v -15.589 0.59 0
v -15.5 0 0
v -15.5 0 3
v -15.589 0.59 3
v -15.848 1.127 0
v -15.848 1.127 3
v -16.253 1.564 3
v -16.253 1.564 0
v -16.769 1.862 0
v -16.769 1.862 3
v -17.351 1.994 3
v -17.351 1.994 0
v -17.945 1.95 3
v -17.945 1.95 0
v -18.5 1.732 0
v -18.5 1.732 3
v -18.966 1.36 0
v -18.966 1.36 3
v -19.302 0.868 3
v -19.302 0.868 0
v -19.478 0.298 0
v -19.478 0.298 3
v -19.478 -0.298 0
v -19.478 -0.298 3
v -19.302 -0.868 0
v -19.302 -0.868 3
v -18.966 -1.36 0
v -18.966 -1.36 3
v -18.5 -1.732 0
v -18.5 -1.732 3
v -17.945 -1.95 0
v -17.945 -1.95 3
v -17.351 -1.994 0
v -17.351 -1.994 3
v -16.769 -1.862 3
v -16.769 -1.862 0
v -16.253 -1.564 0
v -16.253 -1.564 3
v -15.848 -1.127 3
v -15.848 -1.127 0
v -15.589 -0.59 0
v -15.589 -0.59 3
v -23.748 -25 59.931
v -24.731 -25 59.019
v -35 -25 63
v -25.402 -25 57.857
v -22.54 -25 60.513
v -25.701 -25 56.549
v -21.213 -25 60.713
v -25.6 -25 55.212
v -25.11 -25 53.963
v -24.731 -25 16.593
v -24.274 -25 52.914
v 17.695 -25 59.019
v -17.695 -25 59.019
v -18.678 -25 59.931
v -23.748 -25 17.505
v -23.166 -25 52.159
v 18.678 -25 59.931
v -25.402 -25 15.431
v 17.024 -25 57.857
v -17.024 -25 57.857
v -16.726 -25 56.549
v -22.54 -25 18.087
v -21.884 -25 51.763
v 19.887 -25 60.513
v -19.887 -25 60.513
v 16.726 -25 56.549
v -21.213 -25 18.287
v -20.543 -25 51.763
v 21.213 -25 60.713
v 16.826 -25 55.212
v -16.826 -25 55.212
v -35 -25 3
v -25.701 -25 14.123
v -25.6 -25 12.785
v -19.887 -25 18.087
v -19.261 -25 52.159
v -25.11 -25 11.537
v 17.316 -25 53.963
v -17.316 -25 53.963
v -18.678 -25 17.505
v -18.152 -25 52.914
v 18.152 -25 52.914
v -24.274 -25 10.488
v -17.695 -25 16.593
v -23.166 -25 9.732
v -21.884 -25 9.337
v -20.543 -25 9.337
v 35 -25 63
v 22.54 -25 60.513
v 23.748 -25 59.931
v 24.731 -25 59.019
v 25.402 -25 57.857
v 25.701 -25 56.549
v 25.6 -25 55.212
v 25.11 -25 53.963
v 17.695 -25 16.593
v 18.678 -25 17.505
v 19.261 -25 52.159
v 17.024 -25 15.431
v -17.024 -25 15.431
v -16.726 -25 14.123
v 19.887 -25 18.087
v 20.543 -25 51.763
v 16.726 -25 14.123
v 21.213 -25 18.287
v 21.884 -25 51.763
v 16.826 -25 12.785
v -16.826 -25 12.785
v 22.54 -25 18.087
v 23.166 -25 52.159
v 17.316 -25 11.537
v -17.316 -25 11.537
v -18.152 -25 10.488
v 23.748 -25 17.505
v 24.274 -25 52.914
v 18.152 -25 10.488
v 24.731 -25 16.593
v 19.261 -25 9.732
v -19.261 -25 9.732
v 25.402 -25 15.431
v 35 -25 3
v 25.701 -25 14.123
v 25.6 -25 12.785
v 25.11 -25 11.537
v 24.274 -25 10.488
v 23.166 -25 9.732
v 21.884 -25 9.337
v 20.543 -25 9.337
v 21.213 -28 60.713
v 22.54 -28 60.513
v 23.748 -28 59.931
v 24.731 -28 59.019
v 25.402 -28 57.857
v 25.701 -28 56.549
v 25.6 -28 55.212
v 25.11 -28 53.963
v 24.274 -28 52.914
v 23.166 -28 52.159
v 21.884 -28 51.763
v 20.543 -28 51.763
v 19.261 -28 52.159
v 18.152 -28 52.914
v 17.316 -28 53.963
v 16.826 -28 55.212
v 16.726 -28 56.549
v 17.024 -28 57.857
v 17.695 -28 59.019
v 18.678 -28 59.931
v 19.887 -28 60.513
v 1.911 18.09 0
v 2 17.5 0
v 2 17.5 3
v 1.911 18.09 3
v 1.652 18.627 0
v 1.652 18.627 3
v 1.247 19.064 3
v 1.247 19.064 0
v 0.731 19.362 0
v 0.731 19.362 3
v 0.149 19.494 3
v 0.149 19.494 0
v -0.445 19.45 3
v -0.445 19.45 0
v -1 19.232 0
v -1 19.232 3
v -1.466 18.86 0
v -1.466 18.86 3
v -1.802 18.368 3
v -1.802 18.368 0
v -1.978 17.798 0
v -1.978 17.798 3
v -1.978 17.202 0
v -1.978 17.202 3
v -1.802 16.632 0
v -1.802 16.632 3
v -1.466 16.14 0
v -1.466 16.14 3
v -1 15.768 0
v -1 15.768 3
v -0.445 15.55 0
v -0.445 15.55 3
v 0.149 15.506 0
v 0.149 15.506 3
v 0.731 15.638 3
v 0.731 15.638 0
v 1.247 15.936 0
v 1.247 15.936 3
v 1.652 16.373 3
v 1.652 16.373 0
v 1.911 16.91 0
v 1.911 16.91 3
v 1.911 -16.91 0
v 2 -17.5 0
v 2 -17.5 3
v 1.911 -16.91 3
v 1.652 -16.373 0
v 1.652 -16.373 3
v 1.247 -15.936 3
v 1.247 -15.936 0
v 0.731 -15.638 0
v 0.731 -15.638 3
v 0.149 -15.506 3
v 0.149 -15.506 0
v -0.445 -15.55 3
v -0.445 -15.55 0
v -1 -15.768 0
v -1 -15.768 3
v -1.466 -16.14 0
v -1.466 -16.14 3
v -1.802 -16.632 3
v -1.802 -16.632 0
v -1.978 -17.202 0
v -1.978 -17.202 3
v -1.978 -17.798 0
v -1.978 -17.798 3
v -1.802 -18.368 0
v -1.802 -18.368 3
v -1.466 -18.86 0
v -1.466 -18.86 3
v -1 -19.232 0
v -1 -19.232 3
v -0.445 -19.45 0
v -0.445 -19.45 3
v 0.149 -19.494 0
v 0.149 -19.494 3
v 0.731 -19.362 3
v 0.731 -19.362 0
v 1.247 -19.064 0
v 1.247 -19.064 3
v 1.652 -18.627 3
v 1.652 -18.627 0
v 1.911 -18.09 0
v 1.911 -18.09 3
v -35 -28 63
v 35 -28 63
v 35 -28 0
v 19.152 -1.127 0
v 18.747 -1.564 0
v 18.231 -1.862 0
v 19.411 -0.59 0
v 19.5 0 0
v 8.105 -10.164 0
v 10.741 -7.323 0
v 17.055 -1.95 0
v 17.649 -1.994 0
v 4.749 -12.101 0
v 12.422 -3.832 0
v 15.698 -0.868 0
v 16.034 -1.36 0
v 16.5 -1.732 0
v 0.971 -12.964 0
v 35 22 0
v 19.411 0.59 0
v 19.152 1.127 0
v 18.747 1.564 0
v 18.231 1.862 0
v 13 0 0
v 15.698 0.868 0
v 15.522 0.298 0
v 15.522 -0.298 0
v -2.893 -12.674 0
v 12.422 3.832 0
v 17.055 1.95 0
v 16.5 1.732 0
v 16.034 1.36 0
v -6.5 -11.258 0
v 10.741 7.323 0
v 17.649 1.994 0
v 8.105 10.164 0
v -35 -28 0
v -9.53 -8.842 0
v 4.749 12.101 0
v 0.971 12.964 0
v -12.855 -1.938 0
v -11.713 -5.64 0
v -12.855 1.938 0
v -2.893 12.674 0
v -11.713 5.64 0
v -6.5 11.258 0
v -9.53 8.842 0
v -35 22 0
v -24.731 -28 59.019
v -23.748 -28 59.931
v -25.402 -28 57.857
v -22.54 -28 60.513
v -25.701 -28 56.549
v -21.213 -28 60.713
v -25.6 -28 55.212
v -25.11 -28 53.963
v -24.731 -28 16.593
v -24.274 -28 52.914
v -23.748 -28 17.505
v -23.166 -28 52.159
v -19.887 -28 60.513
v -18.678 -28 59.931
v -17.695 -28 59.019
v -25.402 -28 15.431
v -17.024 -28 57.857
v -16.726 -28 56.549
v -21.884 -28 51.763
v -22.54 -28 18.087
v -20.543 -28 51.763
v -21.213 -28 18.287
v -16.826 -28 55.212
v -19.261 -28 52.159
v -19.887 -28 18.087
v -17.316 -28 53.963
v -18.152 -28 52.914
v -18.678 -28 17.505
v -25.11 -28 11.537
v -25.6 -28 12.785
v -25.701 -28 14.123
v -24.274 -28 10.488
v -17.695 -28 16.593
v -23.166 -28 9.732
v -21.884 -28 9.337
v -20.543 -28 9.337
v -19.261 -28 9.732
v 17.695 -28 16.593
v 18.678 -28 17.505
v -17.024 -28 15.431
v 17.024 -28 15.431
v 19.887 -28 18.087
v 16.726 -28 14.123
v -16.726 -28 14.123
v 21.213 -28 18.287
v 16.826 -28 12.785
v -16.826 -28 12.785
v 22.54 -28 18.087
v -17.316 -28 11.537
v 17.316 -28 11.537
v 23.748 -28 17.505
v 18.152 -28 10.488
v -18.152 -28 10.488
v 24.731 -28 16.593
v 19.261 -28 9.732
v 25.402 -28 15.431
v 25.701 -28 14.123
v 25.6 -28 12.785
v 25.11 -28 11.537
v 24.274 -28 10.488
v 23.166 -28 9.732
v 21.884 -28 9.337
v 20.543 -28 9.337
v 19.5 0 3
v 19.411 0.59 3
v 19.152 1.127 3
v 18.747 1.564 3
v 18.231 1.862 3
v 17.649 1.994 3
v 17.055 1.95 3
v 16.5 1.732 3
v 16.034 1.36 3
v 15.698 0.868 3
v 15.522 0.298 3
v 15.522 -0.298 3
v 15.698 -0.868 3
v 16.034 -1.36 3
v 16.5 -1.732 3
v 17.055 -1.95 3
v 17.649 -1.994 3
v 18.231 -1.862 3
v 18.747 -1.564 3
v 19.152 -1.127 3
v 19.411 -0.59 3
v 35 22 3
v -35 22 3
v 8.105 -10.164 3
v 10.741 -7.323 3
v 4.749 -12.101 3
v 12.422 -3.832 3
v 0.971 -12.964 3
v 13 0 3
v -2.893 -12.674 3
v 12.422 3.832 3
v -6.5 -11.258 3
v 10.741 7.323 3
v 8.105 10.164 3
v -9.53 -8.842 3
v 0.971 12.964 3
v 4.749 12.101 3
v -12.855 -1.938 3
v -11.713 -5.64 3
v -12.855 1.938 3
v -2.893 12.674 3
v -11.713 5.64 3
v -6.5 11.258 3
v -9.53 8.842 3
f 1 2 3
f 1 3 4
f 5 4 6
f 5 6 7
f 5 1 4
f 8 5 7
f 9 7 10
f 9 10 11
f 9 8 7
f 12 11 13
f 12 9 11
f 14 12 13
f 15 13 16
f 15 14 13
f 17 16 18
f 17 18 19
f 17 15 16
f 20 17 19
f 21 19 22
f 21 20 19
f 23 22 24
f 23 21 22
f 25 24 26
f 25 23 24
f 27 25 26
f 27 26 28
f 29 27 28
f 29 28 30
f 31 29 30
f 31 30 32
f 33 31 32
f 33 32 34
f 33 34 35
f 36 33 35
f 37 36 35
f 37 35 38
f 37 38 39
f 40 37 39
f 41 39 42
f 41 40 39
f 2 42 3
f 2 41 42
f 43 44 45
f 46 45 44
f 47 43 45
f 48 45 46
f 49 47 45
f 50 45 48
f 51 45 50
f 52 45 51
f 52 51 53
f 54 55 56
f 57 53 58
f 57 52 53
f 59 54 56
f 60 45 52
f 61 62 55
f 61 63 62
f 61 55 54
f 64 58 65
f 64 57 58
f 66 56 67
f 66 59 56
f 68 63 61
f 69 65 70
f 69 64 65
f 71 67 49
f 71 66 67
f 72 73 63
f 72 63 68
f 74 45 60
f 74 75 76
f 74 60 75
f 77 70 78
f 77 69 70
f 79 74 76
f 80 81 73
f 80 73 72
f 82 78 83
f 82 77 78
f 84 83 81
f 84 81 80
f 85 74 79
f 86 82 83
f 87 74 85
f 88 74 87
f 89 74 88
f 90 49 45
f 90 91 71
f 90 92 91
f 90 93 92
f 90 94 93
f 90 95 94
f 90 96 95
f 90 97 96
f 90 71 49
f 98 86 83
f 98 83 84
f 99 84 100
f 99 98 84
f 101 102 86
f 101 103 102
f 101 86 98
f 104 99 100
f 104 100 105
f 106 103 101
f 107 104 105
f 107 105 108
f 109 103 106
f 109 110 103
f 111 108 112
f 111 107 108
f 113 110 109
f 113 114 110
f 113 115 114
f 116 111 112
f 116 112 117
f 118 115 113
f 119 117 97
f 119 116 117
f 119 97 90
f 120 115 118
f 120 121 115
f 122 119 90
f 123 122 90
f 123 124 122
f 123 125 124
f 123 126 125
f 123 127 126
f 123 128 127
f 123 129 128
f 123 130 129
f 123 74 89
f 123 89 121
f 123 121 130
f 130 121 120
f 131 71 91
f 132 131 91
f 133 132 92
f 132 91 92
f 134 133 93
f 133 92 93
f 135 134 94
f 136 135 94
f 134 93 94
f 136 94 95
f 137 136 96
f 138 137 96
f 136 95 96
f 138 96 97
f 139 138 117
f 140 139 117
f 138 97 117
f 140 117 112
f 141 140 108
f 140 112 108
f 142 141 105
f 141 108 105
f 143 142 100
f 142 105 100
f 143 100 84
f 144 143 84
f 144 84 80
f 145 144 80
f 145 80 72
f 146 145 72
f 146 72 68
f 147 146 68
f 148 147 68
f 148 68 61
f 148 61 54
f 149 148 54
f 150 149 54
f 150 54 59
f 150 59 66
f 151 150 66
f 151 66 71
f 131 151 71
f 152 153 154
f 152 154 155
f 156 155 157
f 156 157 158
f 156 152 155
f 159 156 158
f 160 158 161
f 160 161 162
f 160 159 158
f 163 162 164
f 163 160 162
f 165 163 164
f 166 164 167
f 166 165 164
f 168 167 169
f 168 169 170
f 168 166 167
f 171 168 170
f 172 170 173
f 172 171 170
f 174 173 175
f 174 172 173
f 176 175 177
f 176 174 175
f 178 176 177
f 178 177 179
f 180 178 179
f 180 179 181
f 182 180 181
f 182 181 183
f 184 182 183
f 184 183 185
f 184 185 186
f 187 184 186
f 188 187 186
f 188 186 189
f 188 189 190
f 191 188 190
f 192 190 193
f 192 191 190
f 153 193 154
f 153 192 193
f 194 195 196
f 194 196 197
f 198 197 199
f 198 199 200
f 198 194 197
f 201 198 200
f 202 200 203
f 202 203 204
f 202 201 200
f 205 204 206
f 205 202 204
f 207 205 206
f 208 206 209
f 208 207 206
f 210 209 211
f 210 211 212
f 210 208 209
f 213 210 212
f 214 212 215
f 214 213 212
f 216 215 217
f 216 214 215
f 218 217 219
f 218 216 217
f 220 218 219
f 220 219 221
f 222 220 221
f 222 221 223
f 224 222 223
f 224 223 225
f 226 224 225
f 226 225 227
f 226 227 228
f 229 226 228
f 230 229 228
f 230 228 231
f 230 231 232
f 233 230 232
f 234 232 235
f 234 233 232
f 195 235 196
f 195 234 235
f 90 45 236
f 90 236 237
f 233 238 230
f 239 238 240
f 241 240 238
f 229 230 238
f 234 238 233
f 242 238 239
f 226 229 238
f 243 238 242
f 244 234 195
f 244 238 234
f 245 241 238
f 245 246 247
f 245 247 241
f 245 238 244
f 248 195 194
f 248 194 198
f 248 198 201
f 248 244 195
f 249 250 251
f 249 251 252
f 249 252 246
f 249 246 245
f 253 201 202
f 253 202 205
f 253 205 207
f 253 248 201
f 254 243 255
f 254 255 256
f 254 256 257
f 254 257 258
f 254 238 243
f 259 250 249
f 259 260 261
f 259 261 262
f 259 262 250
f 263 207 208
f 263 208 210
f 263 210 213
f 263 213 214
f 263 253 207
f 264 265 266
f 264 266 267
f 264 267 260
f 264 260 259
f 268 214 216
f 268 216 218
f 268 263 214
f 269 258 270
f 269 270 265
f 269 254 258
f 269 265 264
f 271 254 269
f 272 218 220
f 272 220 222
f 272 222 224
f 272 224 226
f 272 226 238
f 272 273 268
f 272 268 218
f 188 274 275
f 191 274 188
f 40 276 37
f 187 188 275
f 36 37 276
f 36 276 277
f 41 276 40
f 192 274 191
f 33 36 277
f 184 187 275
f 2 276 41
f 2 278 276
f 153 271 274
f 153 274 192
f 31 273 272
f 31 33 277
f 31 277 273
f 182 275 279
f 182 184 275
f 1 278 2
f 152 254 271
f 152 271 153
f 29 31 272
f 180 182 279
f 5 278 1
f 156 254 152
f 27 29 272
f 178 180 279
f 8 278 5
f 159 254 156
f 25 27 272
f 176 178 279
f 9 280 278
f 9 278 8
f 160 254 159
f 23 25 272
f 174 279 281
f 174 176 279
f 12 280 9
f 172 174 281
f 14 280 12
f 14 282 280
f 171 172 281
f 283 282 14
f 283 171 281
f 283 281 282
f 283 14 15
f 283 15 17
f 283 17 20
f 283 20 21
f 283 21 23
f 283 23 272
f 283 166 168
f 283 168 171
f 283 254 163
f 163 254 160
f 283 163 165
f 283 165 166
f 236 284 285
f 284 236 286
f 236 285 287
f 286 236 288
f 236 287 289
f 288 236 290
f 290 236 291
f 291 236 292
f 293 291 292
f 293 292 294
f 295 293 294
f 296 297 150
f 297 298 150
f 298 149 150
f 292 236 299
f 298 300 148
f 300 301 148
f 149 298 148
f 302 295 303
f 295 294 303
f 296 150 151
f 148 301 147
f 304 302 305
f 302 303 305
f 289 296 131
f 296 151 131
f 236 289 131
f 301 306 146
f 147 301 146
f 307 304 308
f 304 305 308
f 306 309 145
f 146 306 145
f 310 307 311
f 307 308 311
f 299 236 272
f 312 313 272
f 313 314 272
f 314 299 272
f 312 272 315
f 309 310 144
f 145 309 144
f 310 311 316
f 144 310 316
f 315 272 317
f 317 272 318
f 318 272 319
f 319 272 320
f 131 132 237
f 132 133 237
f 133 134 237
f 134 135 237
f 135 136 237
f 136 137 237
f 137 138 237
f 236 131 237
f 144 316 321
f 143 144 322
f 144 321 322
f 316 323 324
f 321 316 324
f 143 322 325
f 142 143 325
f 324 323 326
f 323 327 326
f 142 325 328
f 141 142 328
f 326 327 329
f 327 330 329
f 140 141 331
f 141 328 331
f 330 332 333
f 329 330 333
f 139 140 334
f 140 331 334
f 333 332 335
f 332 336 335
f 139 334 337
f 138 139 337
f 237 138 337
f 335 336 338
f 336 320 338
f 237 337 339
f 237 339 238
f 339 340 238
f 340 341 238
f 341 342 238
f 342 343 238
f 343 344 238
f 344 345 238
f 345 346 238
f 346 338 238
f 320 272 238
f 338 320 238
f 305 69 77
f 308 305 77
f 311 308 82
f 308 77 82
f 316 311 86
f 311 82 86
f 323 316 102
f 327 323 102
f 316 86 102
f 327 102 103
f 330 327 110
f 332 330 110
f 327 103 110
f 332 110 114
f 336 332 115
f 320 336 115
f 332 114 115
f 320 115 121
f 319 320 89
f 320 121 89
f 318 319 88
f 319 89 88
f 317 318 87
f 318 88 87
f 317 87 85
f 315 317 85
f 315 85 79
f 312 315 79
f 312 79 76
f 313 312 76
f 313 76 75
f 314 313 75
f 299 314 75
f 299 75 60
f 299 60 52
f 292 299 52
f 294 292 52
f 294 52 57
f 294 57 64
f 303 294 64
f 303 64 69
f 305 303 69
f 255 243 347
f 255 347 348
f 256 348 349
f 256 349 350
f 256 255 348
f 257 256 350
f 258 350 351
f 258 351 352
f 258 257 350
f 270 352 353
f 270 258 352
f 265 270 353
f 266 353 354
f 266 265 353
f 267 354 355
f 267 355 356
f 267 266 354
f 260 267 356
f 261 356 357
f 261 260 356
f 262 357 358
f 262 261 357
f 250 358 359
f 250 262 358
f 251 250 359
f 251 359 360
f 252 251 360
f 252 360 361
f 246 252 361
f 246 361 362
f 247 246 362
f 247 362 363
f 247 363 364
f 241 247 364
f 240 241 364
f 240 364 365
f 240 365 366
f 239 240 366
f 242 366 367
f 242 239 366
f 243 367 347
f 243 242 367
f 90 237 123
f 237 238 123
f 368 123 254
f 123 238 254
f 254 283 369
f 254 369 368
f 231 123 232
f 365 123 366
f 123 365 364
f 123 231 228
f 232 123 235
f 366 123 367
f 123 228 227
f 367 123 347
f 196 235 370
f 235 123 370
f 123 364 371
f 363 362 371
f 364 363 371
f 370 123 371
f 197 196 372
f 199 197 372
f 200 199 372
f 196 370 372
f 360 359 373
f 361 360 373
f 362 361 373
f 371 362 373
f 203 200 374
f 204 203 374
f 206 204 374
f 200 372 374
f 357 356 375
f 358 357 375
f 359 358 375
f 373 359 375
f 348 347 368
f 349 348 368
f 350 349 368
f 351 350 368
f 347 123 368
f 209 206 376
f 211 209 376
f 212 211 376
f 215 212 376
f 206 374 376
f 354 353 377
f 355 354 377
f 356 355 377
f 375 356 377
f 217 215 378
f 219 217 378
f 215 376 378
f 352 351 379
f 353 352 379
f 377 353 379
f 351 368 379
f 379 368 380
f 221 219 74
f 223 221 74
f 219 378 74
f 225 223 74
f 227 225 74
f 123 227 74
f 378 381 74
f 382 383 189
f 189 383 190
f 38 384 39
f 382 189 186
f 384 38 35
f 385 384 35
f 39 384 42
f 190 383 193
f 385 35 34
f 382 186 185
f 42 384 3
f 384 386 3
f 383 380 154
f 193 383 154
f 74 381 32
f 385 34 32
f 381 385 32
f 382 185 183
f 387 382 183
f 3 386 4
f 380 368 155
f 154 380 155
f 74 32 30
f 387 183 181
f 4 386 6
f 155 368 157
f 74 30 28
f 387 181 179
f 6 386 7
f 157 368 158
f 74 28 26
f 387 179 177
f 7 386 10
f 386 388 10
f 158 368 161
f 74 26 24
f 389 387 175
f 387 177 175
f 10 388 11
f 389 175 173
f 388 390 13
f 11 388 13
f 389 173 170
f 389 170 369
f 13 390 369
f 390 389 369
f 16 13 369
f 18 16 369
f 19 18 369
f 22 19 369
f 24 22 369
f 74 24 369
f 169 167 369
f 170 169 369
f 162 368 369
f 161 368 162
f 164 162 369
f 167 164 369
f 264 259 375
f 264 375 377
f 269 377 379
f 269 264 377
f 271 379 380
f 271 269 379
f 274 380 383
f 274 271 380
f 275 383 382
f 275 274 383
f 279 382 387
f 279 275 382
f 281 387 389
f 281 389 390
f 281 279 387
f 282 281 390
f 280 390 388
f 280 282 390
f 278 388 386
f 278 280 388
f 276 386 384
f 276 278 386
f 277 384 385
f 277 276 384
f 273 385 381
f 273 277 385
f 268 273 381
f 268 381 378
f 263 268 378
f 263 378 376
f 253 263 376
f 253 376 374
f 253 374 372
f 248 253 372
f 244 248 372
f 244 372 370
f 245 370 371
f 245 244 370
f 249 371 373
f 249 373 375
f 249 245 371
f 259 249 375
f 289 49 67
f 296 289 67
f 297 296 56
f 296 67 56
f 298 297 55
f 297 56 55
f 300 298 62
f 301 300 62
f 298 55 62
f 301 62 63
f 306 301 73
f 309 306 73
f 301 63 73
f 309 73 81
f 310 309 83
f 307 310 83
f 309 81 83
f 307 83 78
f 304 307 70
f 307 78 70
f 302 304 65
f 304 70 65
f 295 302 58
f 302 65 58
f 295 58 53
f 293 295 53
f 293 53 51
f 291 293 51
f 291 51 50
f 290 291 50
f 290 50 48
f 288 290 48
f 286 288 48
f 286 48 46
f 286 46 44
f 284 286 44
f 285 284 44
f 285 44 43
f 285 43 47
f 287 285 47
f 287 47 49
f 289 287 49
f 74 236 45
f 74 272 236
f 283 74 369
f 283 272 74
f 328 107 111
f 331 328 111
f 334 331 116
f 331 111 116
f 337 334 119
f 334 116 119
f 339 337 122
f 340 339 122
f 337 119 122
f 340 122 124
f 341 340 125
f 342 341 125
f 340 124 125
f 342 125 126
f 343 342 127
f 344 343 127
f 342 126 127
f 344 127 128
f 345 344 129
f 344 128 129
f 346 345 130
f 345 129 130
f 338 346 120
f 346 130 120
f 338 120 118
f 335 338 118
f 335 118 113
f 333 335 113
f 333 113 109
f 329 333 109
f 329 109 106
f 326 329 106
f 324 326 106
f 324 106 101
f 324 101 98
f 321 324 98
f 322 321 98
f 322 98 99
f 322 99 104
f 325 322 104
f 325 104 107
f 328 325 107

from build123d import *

# Parameters (mm, degrees)
SKETCH_1_R          = 13
SKETCH_1_R_2        = 2
EXTRUDE_1_DEPTH     = 3
SKETCH_2_W          = 70
SKETCH_2_H          = 3
EXTRUDE_2_DEPTH     = 60
SKETCH_3_R          = 4.5
CUT_EXTRUDE_1_DEPTH = 87.040688049


with BuildPart() as part:
    # 草图1 → 凸台-拉伸1 (new body)
    with BuildSketch(Plane.XY):
        Polygon((-35, 22), (35, 22), (35, -28), (-35, -28), (-35, 0), align=None)
        Circle(SKETCH_1_R, mode=Mode.SUBTRACT)
        with Locations((0, 17.5)):
            Circle(SKETCH_1_R_2, mode=Mode.SUBTRACT)
        with Locations((17.5, 0)):
            Circle(SKETCH_1_R_2, mode=Mode.SUBTRACT)
        with Locations((0, -17.5)):
            Circle(SKETCH_1_R_2, mode=Mode.SUBTRACT)
        with Locations((-17.5, 0)):
            Circle(SKETCH_1_R_2, mode=Mode.SUBTRACT)
    extrude(amount=EXTRUDE_1_DEPTH)

    # 草图2 → 凸台-拉伸2 (add)
    with BuildSketch(Plane.XY.offset(3)):
        with Locations((0, -26.5)):
            Rectangle(SKETCH_2_W, SKETCH_2_H)
    extrude(amount=EXTRUDE_2_DEPTH)

    # 草图3 → 切除-拉伸1 (cut, through all)
    with BuildSketch(Plane(origin=(0, -25, 0), x_dir=(1, 0, 0), z_dir=(0, 1, 0))):
        with Locations(Location((21.213203436, -13.786796564, 0), (0, 0, 270))):
            Circle(SKETCH_3_R)
        with Locations(Location((21.213203436, -56.213203436, 0), (0, 0, 270))):
            Circle(SKETCH_3_R)
        with Locations(Location((-21.213203436, -56.213203436, 0), (0, 0, 270))):
            Circle(SKETCH_3_R)
        with Locations(Location((-21.213203436, -13.786796564, 0), (0, 0, 270))):
            Circle(SKETCH_3_R)
    extrude(amount=-CUT_EXTRUDE_1_DEPTH, mode=Mode.SUBTRACT)


solid = part.part
